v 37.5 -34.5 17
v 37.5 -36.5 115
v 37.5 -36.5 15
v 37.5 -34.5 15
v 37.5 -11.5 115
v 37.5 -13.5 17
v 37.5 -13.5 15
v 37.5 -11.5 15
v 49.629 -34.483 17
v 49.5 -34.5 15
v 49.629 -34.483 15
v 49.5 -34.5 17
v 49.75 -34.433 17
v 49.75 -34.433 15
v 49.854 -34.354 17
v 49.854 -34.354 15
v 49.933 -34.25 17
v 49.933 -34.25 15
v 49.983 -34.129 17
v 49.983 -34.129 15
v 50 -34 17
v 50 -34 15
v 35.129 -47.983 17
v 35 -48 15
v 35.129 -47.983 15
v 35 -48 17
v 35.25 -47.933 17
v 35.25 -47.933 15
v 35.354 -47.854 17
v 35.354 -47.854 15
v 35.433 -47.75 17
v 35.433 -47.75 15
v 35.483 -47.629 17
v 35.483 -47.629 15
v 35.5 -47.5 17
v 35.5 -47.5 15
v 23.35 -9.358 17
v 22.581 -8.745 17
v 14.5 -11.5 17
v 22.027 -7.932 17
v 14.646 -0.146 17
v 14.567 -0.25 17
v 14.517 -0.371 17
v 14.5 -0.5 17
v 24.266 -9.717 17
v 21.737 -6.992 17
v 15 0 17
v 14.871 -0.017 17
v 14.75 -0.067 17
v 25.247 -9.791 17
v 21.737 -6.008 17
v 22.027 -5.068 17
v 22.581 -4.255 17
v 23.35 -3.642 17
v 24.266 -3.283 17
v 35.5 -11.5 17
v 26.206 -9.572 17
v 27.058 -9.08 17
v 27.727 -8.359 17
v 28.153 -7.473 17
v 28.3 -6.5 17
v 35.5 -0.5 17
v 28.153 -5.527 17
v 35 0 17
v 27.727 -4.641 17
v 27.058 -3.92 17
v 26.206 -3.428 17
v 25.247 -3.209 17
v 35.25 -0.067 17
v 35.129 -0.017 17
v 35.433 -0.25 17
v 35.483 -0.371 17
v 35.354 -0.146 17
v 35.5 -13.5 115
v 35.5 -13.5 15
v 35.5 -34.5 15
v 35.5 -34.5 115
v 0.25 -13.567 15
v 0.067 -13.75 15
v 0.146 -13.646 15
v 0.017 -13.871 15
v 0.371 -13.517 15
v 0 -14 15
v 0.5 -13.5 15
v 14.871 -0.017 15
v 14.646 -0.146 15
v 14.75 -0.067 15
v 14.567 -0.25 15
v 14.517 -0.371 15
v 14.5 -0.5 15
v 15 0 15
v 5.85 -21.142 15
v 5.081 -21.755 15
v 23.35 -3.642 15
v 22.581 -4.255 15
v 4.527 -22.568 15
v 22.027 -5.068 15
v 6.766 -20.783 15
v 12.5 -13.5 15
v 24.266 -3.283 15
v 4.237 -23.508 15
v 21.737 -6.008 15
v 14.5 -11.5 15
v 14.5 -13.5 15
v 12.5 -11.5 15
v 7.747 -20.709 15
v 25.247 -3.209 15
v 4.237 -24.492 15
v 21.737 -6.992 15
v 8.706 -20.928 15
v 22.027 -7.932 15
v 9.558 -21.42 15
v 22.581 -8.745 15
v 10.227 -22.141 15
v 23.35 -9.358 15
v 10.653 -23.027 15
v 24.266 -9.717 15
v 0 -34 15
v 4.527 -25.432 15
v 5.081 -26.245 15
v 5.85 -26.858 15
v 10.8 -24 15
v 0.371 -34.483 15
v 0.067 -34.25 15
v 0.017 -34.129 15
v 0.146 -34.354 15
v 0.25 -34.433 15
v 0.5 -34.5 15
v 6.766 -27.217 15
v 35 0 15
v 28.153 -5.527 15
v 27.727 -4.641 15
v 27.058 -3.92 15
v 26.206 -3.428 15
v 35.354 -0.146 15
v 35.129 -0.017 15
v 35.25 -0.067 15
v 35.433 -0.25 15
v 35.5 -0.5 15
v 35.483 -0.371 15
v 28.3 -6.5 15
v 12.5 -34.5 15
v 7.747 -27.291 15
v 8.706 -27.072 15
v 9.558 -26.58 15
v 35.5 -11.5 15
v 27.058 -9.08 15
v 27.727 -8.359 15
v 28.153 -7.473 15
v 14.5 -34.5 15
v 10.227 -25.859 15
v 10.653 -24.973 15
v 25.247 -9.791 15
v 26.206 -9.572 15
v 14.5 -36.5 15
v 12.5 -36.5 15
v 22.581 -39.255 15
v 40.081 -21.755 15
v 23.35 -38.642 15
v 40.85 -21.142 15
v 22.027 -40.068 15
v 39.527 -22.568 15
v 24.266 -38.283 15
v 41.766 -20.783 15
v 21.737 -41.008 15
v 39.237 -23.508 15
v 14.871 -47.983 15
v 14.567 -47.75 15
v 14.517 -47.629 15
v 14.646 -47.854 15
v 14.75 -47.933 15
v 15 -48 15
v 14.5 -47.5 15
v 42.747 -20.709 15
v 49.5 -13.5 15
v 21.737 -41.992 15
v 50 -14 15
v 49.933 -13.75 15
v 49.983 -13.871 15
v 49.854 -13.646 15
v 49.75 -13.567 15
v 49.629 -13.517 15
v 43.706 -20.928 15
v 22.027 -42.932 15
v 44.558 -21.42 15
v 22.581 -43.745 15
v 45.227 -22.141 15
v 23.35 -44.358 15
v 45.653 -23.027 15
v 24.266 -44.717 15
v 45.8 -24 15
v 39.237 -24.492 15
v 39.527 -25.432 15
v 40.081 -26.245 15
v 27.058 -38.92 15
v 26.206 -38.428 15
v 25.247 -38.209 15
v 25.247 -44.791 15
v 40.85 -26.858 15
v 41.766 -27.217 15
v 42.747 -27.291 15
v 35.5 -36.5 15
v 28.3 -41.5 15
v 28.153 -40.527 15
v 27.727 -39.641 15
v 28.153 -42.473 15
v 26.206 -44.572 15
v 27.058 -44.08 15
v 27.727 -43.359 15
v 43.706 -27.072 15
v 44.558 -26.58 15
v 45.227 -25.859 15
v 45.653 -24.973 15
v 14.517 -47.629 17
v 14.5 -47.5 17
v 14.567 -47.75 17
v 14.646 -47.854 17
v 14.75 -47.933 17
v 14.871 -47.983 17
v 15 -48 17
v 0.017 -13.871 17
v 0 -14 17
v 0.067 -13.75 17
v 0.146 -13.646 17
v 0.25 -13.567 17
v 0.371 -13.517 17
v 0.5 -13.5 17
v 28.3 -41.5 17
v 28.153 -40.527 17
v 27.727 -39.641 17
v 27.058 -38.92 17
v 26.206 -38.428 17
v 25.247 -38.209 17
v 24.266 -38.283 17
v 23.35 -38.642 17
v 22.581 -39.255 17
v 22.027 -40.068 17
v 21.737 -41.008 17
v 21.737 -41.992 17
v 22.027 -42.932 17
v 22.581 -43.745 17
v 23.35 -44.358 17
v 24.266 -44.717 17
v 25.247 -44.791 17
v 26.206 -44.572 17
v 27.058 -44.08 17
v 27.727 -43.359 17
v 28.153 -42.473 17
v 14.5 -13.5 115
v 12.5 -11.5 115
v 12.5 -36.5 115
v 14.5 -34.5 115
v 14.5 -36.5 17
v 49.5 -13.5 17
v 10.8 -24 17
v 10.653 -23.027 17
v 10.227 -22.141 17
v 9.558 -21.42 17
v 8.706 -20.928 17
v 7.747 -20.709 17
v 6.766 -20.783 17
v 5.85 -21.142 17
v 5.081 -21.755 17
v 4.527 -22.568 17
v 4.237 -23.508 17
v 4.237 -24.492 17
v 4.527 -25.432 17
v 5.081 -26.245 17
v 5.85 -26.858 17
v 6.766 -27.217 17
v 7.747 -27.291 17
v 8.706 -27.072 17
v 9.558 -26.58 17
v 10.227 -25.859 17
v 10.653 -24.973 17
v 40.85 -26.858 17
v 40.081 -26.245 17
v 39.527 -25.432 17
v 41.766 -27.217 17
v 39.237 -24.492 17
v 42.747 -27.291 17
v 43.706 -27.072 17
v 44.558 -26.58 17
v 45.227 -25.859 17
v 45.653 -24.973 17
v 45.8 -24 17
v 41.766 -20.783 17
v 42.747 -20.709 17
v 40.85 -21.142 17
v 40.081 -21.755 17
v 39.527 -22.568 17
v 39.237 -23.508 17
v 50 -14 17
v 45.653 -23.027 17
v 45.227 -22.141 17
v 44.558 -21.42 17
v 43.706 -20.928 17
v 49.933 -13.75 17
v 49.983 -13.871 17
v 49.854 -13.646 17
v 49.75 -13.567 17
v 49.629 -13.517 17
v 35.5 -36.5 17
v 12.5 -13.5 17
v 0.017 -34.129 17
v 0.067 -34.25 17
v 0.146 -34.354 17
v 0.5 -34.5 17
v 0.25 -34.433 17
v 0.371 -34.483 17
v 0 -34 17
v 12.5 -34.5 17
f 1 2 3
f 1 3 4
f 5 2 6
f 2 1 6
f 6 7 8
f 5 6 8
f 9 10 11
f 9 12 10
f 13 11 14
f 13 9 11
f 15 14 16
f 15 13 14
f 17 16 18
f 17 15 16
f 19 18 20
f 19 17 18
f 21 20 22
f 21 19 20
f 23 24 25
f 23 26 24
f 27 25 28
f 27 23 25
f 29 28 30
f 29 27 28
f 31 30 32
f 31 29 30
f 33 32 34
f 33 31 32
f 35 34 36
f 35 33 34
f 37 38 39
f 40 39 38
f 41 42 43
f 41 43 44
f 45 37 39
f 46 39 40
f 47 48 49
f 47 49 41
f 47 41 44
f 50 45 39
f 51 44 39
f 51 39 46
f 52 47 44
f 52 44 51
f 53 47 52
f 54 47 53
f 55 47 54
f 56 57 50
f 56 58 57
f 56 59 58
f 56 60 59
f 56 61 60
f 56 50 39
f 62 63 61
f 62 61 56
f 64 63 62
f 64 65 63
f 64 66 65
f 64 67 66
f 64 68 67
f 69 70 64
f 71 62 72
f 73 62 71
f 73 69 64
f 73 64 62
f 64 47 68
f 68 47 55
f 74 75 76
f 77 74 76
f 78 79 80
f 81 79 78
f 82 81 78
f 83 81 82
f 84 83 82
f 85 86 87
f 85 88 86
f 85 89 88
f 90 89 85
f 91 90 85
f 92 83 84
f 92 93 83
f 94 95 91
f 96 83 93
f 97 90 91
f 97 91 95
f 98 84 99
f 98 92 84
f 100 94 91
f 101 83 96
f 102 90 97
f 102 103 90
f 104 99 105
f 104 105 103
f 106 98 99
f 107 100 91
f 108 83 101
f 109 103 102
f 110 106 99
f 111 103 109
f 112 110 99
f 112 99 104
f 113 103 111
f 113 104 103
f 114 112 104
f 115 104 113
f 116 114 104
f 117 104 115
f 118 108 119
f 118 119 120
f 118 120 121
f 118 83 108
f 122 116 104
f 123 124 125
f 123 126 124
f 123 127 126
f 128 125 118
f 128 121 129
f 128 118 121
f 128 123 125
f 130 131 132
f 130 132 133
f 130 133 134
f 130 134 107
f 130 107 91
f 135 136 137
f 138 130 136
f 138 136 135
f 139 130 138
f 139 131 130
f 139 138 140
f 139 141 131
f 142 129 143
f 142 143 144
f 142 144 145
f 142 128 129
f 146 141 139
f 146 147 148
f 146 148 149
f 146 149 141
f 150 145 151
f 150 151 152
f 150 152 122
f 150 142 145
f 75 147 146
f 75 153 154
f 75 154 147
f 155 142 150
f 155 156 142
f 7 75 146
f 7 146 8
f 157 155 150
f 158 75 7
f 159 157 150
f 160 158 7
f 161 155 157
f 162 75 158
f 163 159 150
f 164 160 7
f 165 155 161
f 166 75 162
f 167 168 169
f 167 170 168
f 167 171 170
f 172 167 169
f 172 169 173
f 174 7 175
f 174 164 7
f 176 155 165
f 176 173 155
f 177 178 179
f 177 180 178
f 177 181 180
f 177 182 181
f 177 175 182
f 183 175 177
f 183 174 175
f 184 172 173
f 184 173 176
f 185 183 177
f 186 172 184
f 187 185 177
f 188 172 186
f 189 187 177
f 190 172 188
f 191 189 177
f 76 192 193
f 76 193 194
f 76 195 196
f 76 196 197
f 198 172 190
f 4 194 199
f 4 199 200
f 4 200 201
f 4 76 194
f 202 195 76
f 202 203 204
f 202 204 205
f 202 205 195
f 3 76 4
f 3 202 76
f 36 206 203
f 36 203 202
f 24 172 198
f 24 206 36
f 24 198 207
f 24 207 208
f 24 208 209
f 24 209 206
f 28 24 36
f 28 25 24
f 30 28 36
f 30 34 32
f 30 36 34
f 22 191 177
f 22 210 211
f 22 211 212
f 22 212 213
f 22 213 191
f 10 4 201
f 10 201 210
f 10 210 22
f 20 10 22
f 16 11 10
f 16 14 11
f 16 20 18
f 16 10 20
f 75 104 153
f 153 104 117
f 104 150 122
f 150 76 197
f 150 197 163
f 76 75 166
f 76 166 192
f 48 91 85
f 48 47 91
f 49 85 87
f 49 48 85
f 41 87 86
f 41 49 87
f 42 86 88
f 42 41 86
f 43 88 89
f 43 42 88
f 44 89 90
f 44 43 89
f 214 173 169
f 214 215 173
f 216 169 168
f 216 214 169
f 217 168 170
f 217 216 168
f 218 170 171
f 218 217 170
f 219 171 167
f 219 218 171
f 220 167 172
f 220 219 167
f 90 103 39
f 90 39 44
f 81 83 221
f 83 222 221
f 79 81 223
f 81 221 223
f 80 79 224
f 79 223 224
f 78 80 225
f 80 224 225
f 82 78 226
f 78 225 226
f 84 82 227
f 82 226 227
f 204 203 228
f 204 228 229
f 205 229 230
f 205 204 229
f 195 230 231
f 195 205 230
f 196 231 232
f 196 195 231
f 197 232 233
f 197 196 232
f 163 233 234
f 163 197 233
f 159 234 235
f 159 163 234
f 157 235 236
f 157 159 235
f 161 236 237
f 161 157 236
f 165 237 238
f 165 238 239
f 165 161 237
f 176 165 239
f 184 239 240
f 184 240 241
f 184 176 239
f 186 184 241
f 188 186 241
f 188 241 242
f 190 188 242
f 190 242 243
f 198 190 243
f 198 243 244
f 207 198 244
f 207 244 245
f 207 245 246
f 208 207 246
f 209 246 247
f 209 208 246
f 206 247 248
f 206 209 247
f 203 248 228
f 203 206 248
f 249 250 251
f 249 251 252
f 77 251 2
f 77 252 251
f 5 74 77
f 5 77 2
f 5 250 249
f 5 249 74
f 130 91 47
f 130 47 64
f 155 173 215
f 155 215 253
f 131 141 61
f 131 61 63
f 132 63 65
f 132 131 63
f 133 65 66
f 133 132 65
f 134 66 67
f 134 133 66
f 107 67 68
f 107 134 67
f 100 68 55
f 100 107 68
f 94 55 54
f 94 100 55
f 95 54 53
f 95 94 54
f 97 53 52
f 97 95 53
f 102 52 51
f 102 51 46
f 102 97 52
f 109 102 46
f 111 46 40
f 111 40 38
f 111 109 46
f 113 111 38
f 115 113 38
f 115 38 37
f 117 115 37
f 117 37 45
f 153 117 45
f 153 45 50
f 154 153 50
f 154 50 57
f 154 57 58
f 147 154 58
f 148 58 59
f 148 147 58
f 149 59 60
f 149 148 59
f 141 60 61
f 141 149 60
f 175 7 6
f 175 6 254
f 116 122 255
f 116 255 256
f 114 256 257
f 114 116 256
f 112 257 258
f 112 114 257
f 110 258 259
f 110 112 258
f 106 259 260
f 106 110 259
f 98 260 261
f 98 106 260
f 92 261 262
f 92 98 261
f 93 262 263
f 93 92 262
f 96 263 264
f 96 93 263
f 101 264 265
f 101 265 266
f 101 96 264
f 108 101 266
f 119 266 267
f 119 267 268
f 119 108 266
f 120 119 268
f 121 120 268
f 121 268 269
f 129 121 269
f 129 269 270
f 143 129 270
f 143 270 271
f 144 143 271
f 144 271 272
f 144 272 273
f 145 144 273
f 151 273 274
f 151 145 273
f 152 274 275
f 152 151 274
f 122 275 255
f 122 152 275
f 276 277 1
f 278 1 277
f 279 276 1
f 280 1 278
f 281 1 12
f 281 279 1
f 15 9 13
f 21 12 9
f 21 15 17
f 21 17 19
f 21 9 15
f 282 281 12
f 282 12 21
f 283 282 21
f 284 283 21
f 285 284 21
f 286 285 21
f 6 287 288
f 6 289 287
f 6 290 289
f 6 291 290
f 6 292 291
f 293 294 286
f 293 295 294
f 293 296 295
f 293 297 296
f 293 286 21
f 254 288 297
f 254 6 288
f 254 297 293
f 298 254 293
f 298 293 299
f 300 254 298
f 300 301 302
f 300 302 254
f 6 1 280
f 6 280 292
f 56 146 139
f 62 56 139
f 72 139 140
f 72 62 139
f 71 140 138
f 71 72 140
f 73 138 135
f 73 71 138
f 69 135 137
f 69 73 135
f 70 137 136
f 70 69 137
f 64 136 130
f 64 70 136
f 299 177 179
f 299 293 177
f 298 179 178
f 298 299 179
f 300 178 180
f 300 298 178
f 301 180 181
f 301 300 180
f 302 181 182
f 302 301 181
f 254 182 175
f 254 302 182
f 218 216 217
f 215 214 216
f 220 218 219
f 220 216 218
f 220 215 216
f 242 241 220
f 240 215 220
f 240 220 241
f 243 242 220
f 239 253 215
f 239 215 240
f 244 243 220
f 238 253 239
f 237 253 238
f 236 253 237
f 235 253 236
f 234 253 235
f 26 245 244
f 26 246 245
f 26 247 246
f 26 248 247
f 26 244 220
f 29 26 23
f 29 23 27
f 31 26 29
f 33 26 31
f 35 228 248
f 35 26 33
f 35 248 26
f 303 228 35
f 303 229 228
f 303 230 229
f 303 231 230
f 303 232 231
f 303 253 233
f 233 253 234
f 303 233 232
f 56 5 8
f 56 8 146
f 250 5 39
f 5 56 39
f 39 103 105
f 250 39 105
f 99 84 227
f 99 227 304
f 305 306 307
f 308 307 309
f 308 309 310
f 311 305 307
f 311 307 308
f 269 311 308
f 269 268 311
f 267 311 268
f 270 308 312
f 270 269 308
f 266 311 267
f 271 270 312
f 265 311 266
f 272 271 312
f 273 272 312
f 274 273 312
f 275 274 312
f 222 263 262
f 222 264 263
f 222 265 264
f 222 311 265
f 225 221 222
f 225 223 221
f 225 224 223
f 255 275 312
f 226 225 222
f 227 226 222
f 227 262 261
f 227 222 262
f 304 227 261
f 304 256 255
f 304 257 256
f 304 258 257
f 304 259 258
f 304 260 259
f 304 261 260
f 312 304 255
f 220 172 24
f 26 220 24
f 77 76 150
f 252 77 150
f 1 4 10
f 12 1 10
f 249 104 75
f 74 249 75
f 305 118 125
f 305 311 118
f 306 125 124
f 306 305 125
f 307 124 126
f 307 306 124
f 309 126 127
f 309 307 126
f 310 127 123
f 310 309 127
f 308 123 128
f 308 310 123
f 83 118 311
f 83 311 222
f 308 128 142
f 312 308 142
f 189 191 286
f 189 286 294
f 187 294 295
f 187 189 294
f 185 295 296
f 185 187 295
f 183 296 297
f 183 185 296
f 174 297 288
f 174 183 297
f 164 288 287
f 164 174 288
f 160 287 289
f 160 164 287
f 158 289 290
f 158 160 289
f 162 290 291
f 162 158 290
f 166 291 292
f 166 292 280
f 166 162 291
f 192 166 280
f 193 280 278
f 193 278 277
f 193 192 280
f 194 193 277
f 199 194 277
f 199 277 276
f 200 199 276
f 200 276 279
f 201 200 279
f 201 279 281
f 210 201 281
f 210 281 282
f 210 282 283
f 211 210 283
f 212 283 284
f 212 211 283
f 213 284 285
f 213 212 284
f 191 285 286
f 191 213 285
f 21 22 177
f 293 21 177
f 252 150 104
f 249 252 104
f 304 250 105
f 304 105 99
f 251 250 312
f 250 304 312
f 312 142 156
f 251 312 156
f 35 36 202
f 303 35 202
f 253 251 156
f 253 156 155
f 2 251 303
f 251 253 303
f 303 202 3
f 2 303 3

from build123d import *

# Parameters (mm, degrees)
SKETCH_1_W                  = 50
SKETCH_1_H                  = 48
EXTRUDE_1_DEPTH             = 15
HOLE_WIZARD_M5_1_AT_2_COUNT = 2
HOLE_WIZARD_M5_1_AT_2_PITCH = 35
HOLE_WIZARD_M5_1_AT_3_COUNT = 2
HOLE_WIZARD_M5_1_AT_3_PITCH = 49.497474683
HOLE_WIZARD_M5_1_AT_4_COUNT = 2
HOLE_WIZARD_M5_1_AT_4_PITCH = 35
FILLET_1_R                  = 1
SKETCH_11_W                 = 25
SKETCH_11_H                 = 25
SKETCH_11_W_2               = 21
SKETCH_11_H_2               = 21
EXTRUDE_2_DEPTH             = 100
SKETCH_11_3_W               = 21
SKETCH_11_3_H               = 11.5
SKETCH_11_3_R               = 3.3
SKETCH_11_3_W_2             = 12.5
SKETCH_11_3_H_2             = 21
EXTRUDE_3_DEPTH             = 2
SKETCH_12_W                 = 50
SKETCH_12_H                 = 15
CUT_EXTRUDE_1_DEPTH         = 135.272111773
FILLET_3_R                  = 0.5


with BuildPart() as part:
    # 草图1 → 凸台-拉伸1 (new body)
    with BuildSketch(Plane.XY):
        with Locations((25, -24)):
            Rectangle(SKETCH_1_W, SKETCH_1_H)
    extrude(amount=EXTRUDE_1_DEPTH)

    # 草图4 → M5 六角圆柱头螺钉的柱形沉头孔1 (revolve, cut)
    with BuildSketch(Plane(origin=(7.5, -6.5, 15), x_dir=(0, -1, 0), z_dir=(1, 0, 0))):
        Polygon((0, 0), (0, 15), (2.75, 15), (2.75, 6), (5, 6), (5, 0.025), (5.025, 0), align=None)
    hole_wizard_m5_1 = revolve(axis=Axis((7.5, -6.5, 21.35), (0, 0, -1)), mode=Mode.SUBTRACT)

    # M5 六角圆柱头螺钉的柱形沉头孔1 at 2: M5 六角圆柱头螺钉的柱形沉头孔1 ×2
    with Locations(*[(i * HOLE_WIZARD_M5_1_AT_2_PITCH, 0, 0) for i in range(1, HOLE_WIZARD_M5_1_AT_2_COUNT)]):
        add(hole_wizard_m5_1, mode=Mode.SUBTRACT)

    # M5 六角圆柱头螺钉的柱形沉头孔1 at 3: M5 六角圆柱头螺钉的柱形沉头孔1 ×2
    with Locations(*[Vector(0.7071067811865476, -0.7071067811865476, 0) * (i * HOLE_WIZARD_M5_1_AT_3_PITCH) for i in range(1, HOLE_WIZARD_M5_1_AT_3_COUNT)]):
        add(hole_wizard_m5_1, mode=Mode.SUBTRACT)

    # M5 六角圆柱头螺钉的柱形沉头孔1 at 4: M5 六角圆柱头螺钉的柱形沉头孔1 ×2
    with Locations(*[(0, -i * HOLE_WIZARD_M5_1_AT_4_PITCH, 0) for i in range(1, HOLE_WIZARD_M5_1_AT_4_COUNT)]):
        add(hole_wizard_m5_1, mode=Mode.SUBTRACT)

    # 圆角1
    fillet_1_edges = [part.edges().sort_by_distance(p)[0] for p in [
        (50, -48, 7.5),
        (0, -48, 7.5),
        (0, 0, 7.5),
        (50, 0, 7.5),
    ]]
    fillet(fillet_1_edges, radius=FILLET_1_R)

    # 草图10 → M8 六角圆柱头螺钉的柱形沉头孔1 (revolve, cut)
    with BuildSketch(Plane(origin=(25, -24, 0), x_dir=(0, 1, 0), z_dir=(1, 0, 0))):
        Polygon((0, 0), (0, 15), (4.5, 15), (4.5, 10), (7.5, 10), (7.5, 0.025), (7.525, 0), align=None)
    revolve(axis=Axis((25, -24, -6.35), (0, 0, 1)), mode=Mode.SUBTRACT)

    # 草图11 → 凸台-拉伸2 (add)
    with BuildSketch(Plane.XY.offset(15)):
        with Locations((25, -24)):
            Rectangle(SKETCH_11_W, SKETCH_11_H)
        with Locations((25, -24)):
            Rectangle(SKETCH_11_W_2, SKETCH_11_H_2, mode=Mode.SUBTRACT)
    extrude(amount=EXTRUDE_2_DEPTH)

    # 草图11<3> → 凸台-拉伸3 (add)
    # profile 1 of 4: a face of its own
    with BuildSketch(Plane.XY.offset(15)):
        with Locations((25, -5.75)):
            Rectangle(SKETCH_11_3_W, SKETCH_11_3_H)
        with Locations((25, -6.5)):
            Circle(SKETCH_11_3_R, mode=Mode.SUBTRACT)
    # profile 2 of 4: a face of its own
    with BuildSketch(Plane.XY.offset(15)):
        with Locations((6.25, -24)):
            Rectangle(SKETCH_11_3_W_2, SKETCH_11_3_H_2)
        with Locations((7.5, -24)):
            Circle(SKETCH_11_3_R, mode=Mode.SUBTRACT)
    # profile 3 of 4: a face of its own
    with BuildSketch(Plane.XY.offset(15)):
        with Locations((25, -42.25)):
            Rectangle(SKETCH_11_3_W, SKETCH_11_3_H)
        with Locations((25, -41.5)):
            Circle(SKETCH_11_3_R, mode=Mode.SUBTRACT)
    # profile 4 of 4: a face of its own
    with BuildSketch(Plane.XY.offset(15)):
        with Locations((43.75, -24)):
            Rectangle(SKETCH_11_3_W_2, SKETCH_11_3_H_2)
        with Locations((42.5, -24)):
            Circle(SKETCH_11_3_R, mode=Mode.SUBTRACT)
    extrude(amount=EXTRUDE_3_DEPTH)

    # 草图12 → 切除-拉伸1 (cut, through all)
    with BuildSketch(Plane.XZ.offset(48)):
        with Locations((25, 7.5)):
            Rectangle(SKETCH_12_W, SKETCH_12_H)
    extrude(amount=-CUT_EXTRUDE_1_DEPTH, mode=Mode.SUBTRACT)

    # 圆角3
    fillet_3_edges = [part.edges().sort_by_distance(p)[0] for p in [
        (14.5, 0, 16),
        (0, -13.5, 16),
        (35.5, 0, 16),
        (50, -34.5, 16),
        (50, -13.5, 16),
        (35.5, -48, 16),
        (0, -34.5, 16),
        (14.5, -48, 16),
    ]]
    fillet(fillet_3_edges, radius=FILLET_3_R)


solid = part.part
